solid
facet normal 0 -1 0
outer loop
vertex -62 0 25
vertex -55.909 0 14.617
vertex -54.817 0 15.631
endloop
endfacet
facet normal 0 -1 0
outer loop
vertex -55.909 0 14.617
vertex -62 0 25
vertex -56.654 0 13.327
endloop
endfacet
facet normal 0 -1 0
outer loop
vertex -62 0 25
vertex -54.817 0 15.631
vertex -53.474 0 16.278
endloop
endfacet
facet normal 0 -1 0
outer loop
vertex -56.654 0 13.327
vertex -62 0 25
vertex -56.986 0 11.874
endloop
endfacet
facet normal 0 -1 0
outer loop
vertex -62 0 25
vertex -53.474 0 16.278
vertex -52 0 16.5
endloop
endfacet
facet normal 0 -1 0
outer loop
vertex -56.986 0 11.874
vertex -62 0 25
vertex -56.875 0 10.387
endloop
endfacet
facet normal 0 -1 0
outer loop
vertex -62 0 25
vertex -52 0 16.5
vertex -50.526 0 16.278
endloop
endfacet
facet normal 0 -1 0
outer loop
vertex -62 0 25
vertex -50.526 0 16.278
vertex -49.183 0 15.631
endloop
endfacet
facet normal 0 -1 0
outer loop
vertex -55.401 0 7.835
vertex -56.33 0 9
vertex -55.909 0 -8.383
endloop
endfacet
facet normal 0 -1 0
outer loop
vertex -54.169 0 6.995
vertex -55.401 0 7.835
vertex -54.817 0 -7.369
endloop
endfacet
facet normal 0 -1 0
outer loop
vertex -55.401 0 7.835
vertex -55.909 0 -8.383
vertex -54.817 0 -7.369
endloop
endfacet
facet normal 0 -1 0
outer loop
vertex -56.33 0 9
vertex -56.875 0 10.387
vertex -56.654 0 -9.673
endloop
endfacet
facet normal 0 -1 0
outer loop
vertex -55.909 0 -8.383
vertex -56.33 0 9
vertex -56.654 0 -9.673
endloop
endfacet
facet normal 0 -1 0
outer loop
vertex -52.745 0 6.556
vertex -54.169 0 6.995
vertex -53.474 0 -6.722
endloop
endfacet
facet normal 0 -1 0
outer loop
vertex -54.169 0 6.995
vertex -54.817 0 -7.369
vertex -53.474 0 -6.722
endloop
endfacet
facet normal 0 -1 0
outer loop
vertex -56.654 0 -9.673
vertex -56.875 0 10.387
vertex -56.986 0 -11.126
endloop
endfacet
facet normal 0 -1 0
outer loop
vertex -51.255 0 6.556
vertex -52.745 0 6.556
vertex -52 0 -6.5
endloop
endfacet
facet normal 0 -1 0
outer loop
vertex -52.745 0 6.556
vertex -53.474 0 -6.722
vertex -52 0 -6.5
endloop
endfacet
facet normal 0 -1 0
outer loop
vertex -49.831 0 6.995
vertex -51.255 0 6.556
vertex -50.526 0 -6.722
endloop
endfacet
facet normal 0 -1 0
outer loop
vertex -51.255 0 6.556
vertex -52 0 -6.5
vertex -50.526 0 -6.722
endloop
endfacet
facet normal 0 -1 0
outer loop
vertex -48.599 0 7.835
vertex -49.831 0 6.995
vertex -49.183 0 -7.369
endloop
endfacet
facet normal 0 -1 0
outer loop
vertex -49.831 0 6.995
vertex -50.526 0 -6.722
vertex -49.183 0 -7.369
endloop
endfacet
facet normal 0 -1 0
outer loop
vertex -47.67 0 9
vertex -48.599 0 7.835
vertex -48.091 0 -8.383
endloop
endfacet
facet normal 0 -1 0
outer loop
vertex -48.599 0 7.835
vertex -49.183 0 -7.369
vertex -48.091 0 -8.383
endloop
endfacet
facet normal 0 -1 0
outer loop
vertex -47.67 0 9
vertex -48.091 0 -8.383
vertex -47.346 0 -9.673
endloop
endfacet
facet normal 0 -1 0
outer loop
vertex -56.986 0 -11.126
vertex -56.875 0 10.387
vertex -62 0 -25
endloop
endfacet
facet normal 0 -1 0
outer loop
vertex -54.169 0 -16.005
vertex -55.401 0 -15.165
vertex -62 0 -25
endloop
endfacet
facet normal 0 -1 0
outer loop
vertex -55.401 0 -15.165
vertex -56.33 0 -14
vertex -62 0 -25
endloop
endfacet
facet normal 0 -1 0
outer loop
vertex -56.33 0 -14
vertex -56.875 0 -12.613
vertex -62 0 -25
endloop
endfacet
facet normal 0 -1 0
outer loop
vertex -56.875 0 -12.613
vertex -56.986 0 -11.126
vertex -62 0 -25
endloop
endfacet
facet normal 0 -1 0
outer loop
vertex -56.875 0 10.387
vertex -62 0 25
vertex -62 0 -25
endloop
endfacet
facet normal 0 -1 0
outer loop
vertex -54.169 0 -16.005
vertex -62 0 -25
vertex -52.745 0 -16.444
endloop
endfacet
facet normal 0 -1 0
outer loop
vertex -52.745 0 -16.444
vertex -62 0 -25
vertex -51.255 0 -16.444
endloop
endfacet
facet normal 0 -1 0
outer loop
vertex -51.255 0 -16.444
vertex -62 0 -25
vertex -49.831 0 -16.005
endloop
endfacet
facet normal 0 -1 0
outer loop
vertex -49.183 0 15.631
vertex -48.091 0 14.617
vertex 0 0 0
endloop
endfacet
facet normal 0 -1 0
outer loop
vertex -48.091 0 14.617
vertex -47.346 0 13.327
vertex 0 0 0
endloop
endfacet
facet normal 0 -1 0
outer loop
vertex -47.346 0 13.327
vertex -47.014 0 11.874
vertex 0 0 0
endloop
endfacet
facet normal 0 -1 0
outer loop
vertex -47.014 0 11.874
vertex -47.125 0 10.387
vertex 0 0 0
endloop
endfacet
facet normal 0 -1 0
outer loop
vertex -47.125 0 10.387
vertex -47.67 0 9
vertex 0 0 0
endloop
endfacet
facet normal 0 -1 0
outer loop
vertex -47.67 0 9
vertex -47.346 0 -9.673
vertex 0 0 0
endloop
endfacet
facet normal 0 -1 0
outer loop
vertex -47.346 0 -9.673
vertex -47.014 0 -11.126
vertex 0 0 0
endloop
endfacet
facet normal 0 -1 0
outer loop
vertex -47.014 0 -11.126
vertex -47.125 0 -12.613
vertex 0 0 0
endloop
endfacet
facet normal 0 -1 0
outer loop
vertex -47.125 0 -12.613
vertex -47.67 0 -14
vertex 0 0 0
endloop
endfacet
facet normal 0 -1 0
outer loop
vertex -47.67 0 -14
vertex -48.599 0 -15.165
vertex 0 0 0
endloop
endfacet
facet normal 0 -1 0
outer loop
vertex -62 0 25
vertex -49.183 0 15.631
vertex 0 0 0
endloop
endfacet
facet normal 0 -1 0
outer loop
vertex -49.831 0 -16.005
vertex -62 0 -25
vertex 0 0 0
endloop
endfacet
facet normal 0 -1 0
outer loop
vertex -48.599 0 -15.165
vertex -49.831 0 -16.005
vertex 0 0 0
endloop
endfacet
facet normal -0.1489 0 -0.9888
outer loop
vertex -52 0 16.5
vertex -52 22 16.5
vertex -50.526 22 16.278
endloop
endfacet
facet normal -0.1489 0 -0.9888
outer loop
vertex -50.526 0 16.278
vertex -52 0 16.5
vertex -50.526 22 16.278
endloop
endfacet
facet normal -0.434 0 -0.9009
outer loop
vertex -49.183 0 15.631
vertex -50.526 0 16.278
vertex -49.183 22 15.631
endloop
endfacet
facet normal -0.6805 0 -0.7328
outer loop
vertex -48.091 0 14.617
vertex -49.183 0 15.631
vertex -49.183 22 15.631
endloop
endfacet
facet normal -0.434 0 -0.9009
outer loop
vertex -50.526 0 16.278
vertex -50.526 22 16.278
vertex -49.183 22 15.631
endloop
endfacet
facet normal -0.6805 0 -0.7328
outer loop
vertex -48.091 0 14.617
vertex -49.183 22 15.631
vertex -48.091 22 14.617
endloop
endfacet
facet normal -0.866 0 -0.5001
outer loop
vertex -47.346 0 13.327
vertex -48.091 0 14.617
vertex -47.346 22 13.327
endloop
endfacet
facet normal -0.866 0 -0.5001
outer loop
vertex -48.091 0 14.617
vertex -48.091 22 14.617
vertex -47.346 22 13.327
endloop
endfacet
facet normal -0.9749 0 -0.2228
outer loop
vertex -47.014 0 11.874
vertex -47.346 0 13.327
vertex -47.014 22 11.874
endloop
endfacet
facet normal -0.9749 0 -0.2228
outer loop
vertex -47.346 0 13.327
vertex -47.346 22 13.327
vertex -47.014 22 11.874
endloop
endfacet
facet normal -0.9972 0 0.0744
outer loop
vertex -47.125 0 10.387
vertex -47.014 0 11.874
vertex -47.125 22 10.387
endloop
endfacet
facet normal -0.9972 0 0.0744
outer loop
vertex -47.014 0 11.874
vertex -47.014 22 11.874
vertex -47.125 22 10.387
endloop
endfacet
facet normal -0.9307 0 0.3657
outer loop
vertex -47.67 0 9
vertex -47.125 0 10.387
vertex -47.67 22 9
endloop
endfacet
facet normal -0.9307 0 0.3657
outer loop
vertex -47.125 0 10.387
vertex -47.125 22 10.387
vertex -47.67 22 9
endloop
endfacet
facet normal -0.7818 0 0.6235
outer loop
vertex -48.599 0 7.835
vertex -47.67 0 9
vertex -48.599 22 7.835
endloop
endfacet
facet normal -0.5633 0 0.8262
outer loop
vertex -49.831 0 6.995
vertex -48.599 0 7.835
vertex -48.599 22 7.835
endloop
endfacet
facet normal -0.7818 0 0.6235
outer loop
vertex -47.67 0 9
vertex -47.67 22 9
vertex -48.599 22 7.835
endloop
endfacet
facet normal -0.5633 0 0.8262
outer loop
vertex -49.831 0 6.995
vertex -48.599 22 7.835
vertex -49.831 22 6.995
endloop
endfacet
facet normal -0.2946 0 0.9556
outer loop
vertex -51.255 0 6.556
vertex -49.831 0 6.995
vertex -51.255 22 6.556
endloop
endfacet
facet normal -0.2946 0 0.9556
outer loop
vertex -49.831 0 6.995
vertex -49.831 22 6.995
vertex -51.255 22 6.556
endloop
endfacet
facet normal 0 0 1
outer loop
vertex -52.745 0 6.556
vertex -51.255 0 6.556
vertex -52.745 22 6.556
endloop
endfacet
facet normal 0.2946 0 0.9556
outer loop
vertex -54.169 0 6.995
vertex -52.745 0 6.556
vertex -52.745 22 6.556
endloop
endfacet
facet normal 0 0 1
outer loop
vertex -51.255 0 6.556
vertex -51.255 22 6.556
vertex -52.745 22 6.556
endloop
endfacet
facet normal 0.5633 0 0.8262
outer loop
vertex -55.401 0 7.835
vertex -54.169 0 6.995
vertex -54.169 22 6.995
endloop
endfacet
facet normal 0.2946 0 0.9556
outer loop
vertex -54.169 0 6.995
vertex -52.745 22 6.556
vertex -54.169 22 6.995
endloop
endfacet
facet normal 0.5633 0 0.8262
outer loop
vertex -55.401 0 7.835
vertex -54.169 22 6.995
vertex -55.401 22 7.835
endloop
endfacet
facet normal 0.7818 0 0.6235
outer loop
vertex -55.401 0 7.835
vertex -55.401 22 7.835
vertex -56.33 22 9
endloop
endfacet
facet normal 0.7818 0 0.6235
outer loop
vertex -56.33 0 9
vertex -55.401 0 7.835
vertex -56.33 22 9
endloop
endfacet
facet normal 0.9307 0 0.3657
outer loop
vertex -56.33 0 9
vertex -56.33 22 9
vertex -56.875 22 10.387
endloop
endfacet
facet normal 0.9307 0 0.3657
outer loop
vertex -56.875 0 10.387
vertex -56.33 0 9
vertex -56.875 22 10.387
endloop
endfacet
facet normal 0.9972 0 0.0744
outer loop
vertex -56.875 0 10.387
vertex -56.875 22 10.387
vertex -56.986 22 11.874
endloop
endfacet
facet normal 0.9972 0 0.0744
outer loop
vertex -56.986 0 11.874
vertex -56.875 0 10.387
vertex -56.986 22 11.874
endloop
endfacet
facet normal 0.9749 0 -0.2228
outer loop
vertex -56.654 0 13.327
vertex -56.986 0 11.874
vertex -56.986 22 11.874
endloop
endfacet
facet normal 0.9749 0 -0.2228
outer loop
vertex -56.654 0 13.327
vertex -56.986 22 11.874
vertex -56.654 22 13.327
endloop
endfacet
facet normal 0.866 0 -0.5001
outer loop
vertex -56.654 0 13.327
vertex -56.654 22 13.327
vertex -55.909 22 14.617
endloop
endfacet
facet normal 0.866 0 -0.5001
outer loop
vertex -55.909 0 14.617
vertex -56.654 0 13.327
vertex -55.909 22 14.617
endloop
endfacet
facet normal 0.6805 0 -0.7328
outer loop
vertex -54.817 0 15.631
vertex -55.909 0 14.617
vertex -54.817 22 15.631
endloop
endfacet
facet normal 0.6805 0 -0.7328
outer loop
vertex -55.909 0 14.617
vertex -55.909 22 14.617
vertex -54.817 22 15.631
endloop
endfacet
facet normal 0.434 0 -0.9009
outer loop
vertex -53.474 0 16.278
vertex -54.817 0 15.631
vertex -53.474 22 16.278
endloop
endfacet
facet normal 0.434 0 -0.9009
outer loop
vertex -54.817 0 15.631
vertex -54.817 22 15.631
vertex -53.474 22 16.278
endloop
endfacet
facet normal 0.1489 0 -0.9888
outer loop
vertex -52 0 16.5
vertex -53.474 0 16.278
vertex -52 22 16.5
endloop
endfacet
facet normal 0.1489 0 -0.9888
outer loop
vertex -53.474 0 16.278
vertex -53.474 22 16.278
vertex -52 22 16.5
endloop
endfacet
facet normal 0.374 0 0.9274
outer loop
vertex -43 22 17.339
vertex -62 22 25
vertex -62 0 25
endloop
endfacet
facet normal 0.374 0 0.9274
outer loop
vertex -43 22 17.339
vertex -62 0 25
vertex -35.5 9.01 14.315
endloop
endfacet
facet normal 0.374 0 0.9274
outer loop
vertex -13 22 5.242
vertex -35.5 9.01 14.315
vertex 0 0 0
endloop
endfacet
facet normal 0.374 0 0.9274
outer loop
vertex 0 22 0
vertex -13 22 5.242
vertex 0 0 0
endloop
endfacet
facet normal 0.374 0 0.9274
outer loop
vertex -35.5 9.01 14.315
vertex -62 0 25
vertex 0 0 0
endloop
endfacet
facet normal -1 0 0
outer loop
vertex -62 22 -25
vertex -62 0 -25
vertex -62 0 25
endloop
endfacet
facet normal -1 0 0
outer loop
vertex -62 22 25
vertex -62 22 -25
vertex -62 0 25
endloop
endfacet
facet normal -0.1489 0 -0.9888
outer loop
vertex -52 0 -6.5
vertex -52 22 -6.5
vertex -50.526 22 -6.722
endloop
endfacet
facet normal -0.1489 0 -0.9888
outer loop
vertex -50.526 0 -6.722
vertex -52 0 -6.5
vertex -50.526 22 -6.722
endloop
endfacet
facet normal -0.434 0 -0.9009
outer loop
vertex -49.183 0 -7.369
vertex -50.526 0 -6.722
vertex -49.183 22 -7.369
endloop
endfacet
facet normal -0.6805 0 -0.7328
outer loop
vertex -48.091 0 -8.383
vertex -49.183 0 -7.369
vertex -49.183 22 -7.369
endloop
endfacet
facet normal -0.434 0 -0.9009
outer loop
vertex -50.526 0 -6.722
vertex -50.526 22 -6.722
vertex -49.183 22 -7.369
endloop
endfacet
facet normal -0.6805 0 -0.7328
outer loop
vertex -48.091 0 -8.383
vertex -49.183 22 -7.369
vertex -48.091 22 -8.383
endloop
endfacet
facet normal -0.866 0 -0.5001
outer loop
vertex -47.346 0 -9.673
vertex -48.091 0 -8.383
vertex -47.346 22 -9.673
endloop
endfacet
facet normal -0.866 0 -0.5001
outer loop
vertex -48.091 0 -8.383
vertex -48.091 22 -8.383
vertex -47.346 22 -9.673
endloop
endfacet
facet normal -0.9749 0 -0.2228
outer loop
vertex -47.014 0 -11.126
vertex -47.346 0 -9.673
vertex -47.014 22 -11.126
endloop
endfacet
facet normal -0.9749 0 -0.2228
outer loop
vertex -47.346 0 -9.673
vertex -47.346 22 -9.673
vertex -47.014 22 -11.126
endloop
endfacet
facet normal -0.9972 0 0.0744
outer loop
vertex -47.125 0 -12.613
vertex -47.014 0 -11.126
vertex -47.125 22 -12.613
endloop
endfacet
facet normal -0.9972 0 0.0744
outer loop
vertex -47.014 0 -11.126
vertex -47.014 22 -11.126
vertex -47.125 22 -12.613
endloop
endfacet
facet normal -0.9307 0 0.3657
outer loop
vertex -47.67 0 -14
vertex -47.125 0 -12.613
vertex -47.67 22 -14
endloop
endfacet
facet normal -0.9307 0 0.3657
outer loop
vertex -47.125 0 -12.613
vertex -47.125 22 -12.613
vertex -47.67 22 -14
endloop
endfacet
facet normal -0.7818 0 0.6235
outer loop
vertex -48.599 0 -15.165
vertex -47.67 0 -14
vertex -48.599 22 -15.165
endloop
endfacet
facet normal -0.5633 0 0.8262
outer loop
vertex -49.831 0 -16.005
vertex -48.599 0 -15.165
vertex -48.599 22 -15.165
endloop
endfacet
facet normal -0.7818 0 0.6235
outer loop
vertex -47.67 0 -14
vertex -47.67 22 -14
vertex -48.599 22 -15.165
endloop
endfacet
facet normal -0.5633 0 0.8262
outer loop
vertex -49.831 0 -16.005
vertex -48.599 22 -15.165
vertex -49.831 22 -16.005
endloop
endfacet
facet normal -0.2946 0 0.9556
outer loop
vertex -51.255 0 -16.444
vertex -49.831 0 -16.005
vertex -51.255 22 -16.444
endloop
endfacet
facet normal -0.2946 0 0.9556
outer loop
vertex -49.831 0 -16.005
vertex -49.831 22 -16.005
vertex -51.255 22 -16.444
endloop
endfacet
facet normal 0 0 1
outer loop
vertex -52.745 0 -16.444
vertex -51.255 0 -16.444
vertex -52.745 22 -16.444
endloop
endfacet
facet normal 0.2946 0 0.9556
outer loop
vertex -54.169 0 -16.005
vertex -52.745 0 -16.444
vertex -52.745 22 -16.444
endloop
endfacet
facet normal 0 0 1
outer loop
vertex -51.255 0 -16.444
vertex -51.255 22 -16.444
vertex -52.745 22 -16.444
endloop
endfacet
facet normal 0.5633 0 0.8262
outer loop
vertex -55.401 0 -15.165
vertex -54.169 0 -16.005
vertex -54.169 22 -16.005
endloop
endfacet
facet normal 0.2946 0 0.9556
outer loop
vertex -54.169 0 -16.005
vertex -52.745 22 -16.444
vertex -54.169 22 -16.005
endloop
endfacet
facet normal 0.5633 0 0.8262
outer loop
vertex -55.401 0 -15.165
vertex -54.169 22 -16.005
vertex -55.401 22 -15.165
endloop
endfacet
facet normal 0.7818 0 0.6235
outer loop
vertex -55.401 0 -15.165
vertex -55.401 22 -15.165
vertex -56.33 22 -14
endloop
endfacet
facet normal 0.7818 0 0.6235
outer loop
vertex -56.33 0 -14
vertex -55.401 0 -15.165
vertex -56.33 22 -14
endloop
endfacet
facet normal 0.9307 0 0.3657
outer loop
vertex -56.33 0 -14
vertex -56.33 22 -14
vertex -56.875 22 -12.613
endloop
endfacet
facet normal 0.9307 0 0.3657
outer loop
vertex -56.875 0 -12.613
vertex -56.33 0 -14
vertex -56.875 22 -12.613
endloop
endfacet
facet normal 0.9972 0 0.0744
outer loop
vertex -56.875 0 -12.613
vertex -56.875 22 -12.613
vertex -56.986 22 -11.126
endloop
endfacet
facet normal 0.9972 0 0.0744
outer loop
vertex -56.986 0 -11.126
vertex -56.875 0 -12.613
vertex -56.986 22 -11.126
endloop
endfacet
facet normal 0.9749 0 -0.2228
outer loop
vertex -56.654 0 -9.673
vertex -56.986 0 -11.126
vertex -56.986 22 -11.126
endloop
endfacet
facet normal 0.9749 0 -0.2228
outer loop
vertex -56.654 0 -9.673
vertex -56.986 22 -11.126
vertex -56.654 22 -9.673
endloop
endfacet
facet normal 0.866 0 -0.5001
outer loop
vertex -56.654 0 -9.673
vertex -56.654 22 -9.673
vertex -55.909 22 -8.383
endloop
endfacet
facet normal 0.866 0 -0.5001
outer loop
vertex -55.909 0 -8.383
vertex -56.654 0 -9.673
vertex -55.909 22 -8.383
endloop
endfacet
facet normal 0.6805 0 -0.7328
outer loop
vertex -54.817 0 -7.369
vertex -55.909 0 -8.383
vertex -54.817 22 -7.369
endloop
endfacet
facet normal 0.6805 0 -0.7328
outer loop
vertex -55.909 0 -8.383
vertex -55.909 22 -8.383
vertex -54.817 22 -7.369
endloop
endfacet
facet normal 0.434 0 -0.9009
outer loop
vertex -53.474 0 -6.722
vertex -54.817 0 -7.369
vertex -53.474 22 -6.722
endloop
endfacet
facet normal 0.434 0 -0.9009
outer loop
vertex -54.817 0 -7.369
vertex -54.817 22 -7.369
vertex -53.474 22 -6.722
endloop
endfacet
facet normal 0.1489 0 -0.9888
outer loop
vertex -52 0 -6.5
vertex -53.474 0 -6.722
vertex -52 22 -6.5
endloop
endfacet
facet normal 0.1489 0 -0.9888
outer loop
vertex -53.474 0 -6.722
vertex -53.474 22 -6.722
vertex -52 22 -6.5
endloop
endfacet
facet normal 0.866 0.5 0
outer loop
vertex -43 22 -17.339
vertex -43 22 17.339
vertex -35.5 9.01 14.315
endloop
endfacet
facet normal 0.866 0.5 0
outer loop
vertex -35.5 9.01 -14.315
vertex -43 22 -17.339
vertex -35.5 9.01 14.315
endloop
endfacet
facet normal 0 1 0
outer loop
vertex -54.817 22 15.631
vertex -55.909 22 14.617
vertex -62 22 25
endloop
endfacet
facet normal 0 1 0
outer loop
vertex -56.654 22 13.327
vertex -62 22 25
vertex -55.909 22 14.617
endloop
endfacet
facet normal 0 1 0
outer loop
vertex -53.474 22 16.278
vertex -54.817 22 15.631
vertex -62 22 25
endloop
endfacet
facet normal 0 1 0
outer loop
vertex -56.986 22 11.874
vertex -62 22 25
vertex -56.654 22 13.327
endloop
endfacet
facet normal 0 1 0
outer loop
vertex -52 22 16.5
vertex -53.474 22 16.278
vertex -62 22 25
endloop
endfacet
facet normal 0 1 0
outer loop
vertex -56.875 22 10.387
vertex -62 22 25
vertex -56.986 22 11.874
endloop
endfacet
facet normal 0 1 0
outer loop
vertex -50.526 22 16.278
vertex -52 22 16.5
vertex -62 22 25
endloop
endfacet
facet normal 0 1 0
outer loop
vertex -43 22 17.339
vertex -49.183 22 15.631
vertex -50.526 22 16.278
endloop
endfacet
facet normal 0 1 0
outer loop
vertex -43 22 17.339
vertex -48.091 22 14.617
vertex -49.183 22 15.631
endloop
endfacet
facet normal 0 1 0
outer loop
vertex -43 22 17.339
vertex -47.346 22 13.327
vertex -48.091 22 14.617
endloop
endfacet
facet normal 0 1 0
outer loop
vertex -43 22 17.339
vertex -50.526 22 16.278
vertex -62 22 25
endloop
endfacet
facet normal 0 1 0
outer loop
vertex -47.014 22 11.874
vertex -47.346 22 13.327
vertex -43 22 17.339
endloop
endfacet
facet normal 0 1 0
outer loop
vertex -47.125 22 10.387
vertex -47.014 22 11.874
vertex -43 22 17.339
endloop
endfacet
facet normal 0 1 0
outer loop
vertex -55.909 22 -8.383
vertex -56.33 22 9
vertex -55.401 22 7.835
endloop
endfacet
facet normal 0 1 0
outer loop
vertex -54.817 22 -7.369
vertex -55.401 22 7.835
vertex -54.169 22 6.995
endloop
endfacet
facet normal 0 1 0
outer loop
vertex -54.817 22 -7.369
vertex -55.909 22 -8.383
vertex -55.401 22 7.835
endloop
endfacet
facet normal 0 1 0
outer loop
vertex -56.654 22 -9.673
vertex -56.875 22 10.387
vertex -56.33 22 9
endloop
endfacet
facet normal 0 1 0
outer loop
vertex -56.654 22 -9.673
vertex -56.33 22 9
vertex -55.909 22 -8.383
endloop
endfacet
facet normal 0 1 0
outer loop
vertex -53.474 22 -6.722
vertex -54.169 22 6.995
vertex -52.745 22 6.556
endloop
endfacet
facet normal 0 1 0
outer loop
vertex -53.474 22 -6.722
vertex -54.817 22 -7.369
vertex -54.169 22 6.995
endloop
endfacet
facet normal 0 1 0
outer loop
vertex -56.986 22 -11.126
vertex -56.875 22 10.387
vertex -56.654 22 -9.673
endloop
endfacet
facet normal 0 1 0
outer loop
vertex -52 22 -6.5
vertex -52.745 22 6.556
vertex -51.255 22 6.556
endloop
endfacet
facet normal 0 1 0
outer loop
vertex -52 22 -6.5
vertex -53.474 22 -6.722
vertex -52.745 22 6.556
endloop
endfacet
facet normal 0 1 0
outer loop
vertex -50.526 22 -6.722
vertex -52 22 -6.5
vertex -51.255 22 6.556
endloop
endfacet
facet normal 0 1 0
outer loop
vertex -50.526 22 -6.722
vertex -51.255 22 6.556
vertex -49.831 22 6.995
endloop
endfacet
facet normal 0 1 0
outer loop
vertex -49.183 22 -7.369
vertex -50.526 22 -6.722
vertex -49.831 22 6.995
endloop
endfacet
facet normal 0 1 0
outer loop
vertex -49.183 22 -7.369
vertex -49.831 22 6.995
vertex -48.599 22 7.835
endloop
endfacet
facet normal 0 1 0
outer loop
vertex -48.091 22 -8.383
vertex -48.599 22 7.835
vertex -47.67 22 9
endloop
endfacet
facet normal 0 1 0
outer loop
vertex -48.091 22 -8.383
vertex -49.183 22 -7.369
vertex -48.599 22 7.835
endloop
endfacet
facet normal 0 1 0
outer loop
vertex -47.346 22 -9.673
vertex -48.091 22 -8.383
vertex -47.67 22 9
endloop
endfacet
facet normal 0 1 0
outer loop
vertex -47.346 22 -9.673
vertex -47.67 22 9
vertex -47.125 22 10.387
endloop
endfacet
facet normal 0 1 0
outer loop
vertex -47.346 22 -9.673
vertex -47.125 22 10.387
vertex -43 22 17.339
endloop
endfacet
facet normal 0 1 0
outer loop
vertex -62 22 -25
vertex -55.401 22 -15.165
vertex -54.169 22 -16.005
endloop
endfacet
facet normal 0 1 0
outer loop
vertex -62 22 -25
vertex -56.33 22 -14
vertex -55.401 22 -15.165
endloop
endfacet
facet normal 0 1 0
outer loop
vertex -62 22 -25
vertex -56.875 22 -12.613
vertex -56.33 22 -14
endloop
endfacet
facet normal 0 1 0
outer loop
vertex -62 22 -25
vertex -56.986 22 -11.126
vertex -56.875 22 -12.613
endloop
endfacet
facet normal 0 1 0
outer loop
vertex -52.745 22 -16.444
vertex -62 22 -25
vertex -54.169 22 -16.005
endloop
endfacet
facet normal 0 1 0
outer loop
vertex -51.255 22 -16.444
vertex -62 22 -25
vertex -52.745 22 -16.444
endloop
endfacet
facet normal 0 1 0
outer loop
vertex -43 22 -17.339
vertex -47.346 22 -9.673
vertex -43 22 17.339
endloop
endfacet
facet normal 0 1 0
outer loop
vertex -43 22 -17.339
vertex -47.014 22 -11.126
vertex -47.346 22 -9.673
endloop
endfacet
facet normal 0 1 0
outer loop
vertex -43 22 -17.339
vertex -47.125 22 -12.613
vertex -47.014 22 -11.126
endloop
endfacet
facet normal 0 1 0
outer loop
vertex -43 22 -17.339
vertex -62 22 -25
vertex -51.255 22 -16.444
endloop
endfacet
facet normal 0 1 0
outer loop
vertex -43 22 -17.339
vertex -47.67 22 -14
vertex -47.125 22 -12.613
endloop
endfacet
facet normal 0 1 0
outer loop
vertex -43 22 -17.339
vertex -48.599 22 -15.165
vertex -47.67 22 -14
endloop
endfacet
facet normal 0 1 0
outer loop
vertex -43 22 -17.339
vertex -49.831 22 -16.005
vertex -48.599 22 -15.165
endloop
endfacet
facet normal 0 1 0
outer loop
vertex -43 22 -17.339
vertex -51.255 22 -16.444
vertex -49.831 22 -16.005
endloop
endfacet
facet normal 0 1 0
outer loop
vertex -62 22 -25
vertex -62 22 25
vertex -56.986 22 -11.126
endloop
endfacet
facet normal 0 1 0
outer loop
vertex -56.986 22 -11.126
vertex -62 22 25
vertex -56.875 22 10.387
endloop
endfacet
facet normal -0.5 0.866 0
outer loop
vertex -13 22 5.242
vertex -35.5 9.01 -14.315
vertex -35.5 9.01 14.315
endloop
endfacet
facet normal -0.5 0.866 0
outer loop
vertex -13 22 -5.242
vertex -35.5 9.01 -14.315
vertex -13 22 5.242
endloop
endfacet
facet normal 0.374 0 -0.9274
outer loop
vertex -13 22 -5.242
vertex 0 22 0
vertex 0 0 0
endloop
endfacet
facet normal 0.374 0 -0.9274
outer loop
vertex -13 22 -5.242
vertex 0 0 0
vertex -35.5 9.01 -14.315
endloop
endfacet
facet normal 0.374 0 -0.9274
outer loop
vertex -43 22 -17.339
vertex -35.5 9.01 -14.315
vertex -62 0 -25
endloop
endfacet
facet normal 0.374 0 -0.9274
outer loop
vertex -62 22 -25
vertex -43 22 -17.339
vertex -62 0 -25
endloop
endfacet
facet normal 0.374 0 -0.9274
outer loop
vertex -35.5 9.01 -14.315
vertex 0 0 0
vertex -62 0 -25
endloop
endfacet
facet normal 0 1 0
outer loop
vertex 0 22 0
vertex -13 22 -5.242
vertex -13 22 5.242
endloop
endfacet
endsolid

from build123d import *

# Parameters (mm, degrees)
EXTRUDE_1_DEPTH          = 22
CUT_EXTRUDE_1_DEPTH      = 22
CUT_EXTRUDE_1_DEPTH_BACK = 22
SKETCH_4_R               = 5
CUT_EXTRUDE_2_DEPTH      = 22


with BuildPart() as part:
    # 스케치1 → 보스-돌출1 (new body)
    with BuildSketch(Plane(origin=(0, 0, 0), x_dir=(1, 0, 0), z_dir=(0, 1, 0))):
        Polygon((0, 0), (-62, 25), (-62, -25), align=None)
    extrude(amount=EXTRUDE_1_DEPTH)

    # 스케치3 → 컷-돌출1 (cut, two sides: drawn at the far end of the back side and taken through both)
    with BuildSketch(Plane.XY.offset(-CUT_EXTRUDE_1_DEPTH_BACK)):
        Polygon((-35.5, 9.009618943), (-13, 22), (-43, 22), align=None)
    extrude(amount=CUT_EXTRUDE_1_DEPTH + CUT_EXTRUDE_1_DEPTH_BACK, mode=Mode.SUBTRACT)

    # 스케치4 → 컷-돌출2 (cut)
    with BuildSketch(Plane(origin=(0, 22, 0), x_dir=(1, 0, 0), z_dir=(0, 1, 0))):
        with Locations((-52, -11.5)):
            Circle(SKETCH_4_R)
        with Locations((-52, 11.5)):
            Circle(SKETCH_4_R)
    extrude(amount=-CUT_EXTRUDE_2_DEPTH, mode=Mode.SUBTRACT)


solid = part.part
